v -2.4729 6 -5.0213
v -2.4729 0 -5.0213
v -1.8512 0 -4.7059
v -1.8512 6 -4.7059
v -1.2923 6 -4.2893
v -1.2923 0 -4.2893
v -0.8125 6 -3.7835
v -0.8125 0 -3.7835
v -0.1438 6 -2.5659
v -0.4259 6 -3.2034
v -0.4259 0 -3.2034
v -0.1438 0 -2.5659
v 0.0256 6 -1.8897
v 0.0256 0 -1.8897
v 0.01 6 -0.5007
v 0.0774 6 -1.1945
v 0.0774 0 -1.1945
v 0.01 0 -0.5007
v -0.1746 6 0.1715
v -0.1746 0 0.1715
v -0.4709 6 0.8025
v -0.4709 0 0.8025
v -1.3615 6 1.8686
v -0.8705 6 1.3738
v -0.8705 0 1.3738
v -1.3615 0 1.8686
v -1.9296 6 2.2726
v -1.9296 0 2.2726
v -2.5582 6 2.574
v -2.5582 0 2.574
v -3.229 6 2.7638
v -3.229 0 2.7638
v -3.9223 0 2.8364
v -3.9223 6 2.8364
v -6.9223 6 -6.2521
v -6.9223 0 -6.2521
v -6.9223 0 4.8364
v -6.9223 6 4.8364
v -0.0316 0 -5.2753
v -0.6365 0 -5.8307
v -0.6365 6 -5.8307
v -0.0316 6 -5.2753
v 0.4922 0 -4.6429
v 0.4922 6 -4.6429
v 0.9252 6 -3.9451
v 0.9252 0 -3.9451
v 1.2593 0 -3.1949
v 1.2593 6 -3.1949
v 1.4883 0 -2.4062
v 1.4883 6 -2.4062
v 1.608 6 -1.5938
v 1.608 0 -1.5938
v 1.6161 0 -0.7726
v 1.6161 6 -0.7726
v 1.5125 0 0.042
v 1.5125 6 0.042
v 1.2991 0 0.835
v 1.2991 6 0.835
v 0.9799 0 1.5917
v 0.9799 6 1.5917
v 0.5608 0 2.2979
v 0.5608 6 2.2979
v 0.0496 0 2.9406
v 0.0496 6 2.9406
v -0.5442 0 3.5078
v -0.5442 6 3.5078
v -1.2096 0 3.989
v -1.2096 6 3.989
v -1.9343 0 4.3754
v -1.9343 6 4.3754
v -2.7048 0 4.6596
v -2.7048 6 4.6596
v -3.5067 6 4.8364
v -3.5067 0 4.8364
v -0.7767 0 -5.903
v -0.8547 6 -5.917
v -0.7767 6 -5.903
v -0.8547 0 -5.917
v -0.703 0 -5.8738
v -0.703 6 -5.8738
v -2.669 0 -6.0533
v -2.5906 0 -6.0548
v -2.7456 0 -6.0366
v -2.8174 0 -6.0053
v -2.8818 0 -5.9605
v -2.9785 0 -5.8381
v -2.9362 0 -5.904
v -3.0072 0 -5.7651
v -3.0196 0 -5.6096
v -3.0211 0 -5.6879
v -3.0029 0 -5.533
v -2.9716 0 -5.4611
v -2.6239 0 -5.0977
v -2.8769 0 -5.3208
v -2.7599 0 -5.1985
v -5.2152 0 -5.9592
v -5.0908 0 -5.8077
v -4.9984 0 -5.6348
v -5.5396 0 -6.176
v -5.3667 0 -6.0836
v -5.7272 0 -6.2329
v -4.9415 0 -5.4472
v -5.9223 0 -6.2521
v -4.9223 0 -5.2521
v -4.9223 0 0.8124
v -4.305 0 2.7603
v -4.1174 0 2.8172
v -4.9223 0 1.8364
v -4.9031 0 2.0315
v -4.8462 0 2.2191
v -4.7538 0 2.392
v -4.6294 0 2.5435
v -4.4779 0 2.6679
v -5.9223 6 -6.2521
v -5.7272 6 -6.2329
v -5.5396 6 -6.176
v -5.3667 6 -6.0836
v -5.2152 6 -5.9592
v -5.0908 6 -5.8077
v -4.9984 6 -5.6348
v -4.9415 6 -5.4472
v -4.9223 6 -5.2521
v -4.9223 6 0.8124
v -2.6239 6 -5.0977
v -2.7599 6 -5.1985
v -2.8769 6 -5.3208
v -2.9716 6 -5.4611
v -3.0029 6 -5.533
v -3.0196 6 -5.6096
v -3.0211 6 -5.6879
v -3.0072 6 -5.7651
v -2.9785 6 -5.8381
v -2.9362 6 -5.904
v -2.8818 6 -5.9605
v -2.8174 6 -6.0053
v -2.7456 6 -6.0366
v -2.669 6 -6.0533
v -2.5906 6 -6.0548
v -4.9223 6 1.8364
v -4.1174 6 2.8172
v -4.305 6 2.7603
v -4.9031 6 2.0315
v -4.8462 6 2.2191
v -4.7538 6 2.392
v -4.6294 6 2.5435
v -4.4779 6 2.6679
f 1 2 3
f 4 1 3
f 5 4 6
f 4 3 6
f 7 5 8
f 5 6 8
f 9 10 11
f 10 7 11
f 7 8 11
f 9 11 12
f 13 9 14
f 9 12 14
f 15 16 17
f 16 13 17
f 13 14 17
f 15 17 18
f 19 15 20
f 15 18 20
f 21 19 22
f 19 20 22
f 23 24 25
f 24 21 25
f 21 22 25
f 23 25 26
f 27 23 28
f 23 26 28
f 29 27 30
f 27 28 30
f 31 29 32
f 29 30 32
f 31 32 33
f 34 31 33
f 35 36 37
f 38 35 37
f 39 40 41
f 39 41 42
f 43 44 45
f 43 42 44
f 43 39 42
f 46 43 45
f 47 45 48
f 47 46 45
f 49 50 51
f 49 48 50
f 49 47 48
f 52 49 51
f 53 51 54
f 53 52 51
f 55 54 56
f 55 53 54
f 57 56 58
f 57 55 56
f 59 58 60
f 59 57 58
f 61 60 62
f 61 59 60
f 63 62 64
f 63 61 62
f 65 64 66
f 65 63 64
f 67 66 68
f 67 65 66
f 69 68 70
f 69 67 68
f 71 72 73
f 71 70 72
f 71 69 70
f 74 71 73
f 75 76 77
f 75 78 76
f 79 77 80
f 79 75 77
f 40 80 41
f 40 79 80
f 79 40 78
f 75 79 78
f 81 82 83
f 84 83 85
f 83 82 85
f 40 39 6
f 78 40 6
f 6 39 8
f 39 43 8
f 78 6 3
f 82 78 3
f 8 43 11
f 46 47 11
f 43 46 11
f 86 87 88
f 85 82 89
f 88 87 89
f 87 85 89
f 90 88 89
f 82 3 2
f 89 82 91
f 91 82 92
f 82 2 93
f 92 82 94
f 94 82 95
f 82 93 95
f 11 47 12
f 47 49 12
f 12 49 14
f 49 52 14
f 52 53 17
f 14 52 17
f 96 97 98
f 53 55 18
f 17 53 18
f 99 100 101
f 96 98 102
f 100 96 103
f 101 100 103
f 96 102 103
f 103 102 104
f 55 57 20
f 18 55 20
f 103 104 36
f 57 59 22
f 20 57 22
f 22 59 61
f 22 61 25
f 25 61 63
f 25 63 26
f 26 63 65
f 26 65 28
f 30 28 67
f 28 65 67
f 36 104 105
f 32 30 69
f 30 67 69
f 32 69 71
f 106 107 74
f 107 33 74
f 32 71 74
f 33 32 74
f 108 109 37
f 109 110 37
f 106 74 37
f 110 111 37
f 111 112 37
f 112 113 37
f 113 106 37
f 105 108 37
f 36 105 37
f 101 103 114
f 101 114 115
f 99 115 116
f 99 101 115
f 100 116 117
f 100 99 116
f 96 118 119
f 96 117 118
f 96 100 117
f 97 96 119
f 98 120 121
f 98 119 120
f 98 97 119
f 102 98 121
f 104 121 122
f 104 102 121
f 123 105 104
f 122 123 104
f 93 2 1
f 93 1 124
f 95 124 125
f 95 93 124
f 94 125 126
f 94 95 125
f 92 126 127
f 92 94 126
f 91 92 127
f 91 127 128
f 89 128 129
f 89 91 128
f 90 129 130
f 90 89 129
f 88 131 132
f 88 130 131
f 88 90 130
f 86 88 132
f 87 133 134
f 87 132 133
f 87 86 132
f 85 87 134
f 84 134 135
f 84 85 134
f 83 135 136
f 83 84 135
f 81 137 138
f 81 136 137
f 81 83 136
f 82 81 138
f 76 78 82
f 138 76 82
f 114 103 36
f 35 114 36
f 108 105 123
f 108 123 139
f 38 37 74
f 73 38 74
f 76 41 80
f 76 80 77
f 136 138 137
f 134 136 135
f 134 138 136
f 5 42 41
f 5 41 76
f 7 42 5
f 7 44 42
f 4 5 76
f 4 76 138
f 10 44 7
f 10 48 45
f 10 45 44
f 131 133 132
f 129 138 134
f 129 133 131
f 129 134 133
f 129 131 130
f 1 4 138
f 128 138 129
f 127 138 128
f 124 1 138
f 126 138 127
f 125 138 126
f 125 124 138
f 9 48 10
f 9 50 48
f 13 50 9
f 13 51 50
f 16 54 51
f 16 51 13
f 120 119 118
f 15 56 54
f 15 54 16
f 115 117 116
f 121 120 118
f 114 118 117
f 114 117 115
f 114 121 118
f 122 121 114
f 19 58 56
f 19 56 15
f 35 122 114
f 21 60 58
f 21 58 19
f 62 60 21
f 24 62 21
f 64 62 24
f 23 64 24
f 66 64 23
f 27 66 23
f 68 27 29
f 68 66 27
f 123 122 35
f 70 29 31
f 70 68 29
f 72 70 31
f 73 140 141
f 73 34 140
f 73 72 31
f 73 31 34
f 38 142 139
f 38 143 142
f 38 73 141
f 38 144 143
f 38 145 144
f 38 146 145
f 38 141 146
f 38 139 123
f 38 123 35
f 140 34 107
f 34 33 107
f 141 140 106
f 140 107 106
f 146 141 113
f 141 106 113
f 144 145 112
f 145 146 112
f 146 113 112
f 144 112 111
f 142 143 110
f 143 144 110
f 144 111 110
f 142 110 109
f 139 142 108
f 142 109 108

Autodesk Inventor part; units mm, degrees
ref_plane "YZ Plane" through (0, 0, 0) normal (1, 0, 0) x (0, 1, 0)
ref_plane "XZ Plane" through (0, 0, 0) normal (0, 1, 0) x (-1, 0, 0)
ref_plane "XY Plane" through (0, 0, 0) normal (0, 0, 1) x (1, 0, 0)
sketch "Sketch1" plane through (0, 0, 0) normal (0, 1, 0) x (-1, 0, 0)
  line L0 (4.9223, 0.8124) -> (4.9223, -5.2521)
  line L1 (5.9223, -6.2521) -> (6.9223, -6.2521)
  line L2 (6.9223, -6.2521) -> (6.9223, 4.8364)
  line L3 (6.9223, 4.8364) -> (3.5067, 4.8364)
  arc A0 (3.5067, 4.8364) -> (0.6365, -5.8307) centre (4.4005, -1.1238) ccw
  arc A1 (4.0891, 2.8364) -> (2.4729, -5.0213) centre (4, -1.2403) ccw
  arc A2 (2.9716, -5.4611) -> (2.4729, -5.0213) centre (2.0984, -5.9485) ccw
  arc A3 (4.9223, -5.2521) -> (5.9223, -6.2521) centre (5.9223, -5.2521) ccw
  line L4 (4.9223, 0.8124) -> (4.9223, 1.8364)
  line L5 (3.9223, 2.8364) -> (4.0891, 2.8364)
  arc A4 (4.9223, 1.8364) -> (3.9223, 2.8364) centre (3.9223, 1.8364) ccw
  line L6 (0.8547, -5.917) -> (2.5906, -6.0548)
  arc A5 (2.5906, -6.0548) -> (2.9716, -5.4611) centre (2.6223, -5.656) ccw
  arc A6 (0.6365, -5.8307) -> (0.8547, -5.917) centre (0.8864, -5.5183) ccw
  point P0 (0, 0)
  point P1 (4.9223, -6.2521)
  point P2 (2.9653, -6.9772)
  point P3 (2.8675, -5.1576)
  point P4 (3.0877, -6.0942)
  point P5 (0.7347, -5.9075)
  dimension "d1" = 2
  dimension "d5" = 1
  dimension "d7" = 5
  dimension "d8" = 1
  dimension "d9" = 2
  dimension "d10" = 1
  dimension "d13" = 0.4
  dimension "d14" = 2.3
extrude "Extrusion1" add sketch "Sketch1" along normal blind 6
properties part number "cable hook 5mm-2mm opening"
